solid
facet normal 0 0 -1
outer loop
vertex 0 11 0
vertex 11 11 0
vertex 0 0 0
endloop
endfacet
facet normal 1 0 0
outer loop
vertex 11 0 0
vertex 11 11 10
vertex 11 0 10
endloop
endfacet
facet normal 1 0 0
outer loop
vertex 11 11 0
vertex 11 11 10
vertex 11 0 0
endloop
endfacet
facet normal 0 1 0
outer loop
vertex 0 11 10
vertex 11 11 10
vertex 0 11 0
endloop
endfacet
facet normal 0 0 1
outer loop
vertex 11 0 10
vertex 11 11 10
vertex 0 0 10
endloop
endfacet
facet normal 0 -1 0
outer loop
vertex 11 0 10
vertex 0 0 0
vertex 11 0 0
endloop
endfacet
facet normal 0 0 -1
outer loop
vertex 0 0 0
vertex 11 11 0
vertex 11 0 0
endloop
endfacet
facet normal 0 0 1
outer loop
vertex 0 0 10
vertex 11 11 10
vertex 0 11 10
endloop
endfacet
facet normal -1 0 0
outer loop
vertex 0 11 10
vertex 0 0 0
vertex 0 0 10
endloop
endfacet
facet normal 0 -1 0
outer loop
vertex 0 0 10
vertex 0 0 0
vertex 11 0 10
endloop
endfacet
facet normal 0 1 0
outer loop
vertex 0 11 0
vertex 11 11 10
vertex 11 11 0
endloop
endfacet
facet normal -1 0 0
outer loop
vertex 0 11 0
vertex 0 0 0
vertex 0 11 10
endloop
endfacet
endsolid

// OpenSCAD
input_length = 10;
input_height = 10;
input_depth = 10;
box_size = 1;

module box(input_length, input_depth, input_height, box_size){
	length = input_length;
	height = input_height - box_size;
	depth = input_depth;

	bottom_back_left =   [0,      0,     0];
	top_back_left =      [0,      0,     height];
	bottom_front_left =  [0,      depth, 0];
	top_front_left =     [0,      depth, height];
	bottom_back_right =  [length, 0,     0];
	top_back_right =     [length, 0,     height];
	bottom_front_right = [length, depth, 0];
	top_front_right =    [length, depth, height];

	box = [bottom_back_left, top_back_left, bottom_front_left, top_front_left, bottom_back_right, top_back_right, bottom_front_right, top_front_right];

	hull(){
		for(position = box){
			translate(position){
				cube(box_size);
			}
		}
	}
}

box(input_length, input_depth, input_height, box_size);
